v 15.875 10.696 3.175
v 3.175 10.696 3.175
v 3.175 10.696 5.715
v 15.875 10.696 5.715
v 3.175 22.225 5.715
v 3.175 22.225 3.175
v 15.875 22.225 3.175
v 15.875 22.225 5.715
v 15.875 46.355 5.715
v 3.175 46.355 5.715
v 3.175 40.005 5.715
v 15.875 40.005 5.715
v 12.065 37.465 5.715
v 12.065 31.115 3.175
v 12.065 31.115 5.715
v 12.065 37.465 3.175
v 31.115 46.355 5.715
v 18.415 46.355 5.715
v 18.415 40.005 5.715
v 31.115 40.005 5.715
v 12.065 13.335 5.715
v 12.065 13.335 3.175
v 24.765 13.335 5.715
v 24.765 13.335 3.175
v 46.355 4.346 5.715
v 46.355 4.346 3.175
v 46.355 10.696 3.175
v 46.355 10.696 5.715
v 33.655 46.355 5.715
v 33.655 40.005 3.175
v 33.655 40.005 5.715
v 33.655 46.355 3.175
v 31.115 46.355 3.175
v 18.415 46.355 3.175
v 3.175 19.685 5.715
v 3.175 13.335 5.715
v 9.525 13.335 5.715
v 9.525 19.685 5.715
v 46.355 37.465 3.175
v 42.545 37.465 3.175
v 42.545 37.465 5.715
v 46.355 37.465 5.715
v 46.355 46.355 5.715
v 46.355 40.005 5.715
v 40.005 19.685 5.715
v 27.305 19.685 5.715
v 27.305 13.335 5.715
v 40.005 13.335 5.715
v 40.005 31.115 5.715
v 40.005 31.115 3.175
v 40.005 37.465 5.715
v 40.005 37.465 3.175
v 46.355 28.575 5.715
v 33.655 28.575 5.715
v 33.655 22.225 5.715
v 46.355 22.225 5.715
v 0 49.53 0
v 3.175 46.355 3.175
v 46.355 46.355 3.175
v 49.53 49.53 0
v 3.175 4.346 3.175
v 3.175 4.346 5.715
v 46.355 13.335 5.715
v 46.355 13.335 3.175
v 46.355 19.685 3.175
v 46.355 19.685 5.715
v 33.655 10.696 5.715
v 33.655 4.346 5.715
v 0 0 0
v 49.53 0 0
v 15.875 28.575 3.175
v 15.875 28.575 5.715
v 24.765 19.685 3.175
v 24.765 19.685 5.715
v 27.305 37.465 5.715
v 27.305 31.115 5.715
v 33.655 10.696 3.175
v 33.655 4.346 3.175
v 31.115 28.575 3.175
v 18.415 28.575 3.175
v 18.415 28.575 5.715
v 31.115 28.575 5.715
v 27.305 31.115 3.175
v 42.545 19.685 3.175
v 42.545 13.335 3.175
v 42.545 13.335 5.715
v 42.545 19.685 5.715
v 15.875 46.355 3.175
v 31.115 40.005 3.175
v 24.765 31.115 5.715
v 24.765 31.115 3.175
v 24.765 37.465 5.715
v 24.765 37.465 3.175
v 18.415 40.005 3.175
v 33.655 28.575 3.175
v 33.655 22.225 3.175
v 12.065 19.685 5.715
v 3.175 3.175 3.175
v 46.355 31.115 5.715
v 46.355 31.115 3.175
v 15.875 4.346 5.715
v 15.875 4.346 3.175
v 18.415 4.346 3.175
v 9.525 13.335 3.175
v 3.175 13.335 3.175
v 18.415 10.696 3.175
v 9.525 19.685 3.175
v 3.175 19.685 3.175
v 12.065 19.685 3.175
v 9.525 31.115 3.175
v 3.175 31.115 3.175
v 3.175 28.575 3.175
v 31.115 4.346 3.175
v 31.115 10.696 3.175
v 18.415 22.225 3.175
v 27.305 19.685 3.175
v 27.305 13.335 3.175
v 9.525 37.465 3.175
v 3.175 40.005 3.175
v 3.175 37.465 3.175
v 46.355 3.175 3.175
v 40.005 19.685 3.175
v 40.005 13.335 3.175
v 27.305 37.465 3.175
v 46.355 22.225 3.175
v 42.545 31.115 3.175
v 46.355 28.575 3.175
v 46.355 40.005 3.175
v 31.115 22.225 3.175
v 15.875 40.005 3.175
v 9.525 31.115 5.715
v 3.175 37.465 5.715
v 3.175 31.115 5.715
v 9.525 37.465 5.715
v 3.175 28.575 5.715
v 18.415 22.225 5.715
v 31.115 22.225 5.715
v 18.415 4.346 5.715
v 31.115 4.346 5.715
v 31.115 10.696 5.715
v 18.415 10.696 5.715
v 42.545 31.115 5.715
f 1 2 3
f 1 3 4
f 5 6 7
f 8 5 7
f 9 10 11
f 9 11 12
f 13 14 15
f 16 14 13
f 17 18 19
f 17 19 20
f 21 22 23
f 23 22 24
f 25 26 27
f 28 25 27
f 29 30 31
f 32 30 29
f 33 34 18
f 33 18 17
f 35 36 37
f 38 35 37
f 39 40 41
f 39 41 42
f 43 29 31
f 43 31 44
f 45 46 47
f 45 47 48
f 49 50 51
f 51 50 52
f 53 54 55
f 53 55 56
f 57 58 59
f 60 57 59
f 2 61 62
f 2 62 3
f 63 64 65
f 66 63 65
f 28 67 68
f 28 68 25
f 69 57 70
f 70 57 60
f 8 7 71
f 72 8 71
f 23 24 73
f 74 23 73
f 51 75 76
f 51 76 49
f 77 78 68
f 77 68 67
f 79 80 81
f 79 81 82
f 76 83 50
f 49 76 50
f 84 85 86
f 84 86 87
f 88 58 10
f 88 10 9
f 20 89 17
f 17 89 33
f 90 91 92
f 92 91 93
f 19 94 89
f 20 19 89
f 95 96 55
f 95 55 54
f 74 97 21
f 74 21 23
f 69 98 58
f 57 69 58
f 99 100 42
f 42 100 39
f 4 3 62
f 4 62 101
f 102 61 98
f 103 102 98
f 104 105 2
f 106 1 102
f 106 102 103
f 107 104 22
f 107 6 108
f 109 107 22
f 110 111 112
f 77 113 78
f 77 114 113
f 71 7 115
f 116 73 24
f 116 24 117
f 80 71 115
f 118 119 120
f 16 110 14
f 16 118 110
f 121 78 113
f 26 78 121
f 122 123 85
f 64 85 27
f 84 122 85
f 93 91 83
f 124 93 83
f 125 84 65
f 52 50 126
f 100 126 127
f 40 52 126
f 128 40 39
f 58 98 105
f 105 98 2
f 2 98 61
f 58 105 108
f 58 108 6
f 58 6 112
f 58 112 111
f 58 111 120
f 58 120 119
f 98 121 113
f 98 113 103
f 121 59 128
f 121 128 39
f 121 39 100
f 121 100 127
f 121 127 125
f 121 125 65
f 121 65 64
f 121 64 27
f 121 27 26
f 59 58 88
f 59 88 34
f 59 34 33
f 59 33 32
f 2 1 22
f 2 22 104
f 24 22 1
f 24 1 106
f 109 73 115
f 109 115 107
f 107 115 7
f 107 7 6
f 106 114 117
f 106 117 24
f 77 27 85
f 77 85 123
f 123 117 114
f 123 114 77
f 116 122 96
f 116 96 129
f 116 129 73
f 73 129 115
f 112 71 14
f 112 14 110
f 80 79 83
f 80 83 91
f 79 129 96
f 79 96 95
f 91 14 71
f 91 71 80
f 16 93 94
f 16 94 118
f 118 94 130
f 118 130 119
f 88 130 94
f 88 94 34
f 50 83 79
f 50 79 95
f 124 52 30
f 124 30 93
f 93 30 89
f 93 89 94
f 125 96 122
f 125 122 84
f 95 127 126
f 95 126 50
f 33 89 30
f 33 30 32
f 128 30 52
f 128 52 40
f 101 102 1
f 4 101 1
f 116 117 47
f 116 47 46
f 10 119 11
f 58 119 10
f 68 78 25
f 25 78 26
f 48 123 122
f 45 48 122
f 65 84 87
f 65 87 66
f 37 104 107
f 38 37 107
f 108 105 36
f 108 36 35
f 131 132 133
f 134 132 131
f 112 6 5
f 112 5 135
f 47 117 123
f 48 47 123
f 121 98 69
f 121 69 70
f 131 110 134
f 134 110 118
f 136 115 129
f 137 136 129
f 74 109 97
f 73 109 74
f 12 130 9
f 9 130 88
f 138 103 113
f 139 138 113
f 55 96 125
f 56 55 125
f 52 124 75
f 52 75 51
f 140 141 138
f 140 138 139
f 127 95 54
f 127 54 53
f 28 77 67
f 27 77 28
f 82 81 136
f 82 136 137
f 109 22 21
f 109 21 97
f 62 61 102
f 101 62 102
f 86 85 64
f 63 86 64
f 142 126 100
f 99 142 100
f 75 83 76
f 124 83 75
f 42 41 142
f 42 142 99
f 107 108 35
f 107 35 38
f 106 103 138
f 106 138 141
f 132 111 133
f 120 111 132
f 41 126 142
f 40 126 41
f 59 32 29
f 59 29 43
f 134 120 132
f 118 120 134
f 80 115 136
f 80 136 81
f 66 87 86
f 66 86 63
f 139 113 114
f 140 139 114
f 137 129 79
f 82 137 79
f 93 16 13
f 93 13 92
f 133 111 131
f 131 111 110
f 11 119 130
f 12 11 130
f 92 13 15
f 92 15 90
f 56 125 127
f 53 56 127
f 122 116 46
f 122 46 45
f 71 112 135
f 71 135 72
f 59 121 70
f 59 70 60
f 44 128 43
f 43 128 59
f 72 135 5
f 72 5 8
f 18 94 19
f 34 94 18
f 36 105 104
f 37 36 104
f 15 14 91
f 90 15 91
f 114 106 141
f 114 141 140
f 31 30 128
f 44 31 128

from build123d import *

# Parameters (mm, degrees)
F0_W     = 49.53
F0_H     = 49.53
F1_DEPTH = 3.175
F2_SIZE  = 3.17499
F3_W     = 3.81
F3_H     = 6.35
F3_W_2   = 12.7
F3_W_3   = 6.35
F3_W_4   = 12.7000000036
F3_W_5   = 3.8100000384
F3_W_6   = 12.7000000384
F4_DEPTH = 2.54


# Not quite as in the source:
# - a fillet or chamfer is up to 0.001 mm smaller than in the source, because OpenCascade refuses the exact size


with BuildPart() as f1:
    # F0 (on Top) → F1 (new body)
    with BuildSketch(Plane.XY):
        with Locations((24.765, 24.765)):
            Rectangle(F0_W, F0_H)
    extrude(amount=F1_DEPTH)

    # F2 (size 3.175 in the source; OpenCascade refuses exactly that, so slightly less here)
    f2_edges = [f1.edges().sort_by_distance(p)[0] for p in [
        (0, 24.765, 3.175),
        (24.765, 0, 3.175),
        (49.53, 24.765, 3.175),
        (24.765, 49.53, 3.175),
    ]]
    chamfer(f2_edges, length=F2_SIZE)

    # F3 (on face) → F4 (join)
    with BuildSketch(Plane.XY.offset(3.175)):
        with Locations((44.45, 34.29)):
            Rectangle(F3_W, F3_H)
        with Locations((9.525, 43.18)):
            Rectangle(F3_W_2, F3_H)
        with Locations((9.5249999653, 25.4)):
            Rectangle(F3_W_2, F3_H)
        with Locations((24.765, 43.18)):
            Rectangle(F3_W_2, F3_H)
        with Locations((6.3499999653, 16.51)):
            Rectangle(F3_W_3, F3_H)
        with Locations((40.005, 43.18)):
            Rectangle(F3_W_2, F3_H)
        with Locations((33.6549999616, 16.51)):
            Rectangle(F3_W_2, F3_H)
        with Locations((9.525, 7.5206288218)):
            Rectangle(F3_W_2, F3_H)
        with Locations((6.35, 34.29)):
            Rectangle(F3_W_3, F3_H)
        with Locations((24.7649999653, 25.4)):
            Rectangle(F3_W_2, F3_H)
        with Locations((40.0049999982, 7.5206288218)):
            Rectangle(F3_W_4, F3_H)
        with Locations((18.415, 34.29)):
            Rectangle(F3_W_2, F3_H)
        with Locations((18.4149999616, 16.51)):
            Rectangle(F3_W_2, F3_H)
        with Locations((44.4499999808, 16.51)):
            Rectangle(F3_W_5, F3_H)
        with Locations((33.655, 34.29)):
            Rectangle(F3_W_2, F3_H)
        with Locations((40.0049999808, 25.4)):
            Rectangle(F3_W_6, F3_H)
        with Locations((24.765, 7.5206288218)):
            Rectangle(F3_W_2, F3_H)
    extrude(amount=F4_DEPTH)


solid = f1.part
